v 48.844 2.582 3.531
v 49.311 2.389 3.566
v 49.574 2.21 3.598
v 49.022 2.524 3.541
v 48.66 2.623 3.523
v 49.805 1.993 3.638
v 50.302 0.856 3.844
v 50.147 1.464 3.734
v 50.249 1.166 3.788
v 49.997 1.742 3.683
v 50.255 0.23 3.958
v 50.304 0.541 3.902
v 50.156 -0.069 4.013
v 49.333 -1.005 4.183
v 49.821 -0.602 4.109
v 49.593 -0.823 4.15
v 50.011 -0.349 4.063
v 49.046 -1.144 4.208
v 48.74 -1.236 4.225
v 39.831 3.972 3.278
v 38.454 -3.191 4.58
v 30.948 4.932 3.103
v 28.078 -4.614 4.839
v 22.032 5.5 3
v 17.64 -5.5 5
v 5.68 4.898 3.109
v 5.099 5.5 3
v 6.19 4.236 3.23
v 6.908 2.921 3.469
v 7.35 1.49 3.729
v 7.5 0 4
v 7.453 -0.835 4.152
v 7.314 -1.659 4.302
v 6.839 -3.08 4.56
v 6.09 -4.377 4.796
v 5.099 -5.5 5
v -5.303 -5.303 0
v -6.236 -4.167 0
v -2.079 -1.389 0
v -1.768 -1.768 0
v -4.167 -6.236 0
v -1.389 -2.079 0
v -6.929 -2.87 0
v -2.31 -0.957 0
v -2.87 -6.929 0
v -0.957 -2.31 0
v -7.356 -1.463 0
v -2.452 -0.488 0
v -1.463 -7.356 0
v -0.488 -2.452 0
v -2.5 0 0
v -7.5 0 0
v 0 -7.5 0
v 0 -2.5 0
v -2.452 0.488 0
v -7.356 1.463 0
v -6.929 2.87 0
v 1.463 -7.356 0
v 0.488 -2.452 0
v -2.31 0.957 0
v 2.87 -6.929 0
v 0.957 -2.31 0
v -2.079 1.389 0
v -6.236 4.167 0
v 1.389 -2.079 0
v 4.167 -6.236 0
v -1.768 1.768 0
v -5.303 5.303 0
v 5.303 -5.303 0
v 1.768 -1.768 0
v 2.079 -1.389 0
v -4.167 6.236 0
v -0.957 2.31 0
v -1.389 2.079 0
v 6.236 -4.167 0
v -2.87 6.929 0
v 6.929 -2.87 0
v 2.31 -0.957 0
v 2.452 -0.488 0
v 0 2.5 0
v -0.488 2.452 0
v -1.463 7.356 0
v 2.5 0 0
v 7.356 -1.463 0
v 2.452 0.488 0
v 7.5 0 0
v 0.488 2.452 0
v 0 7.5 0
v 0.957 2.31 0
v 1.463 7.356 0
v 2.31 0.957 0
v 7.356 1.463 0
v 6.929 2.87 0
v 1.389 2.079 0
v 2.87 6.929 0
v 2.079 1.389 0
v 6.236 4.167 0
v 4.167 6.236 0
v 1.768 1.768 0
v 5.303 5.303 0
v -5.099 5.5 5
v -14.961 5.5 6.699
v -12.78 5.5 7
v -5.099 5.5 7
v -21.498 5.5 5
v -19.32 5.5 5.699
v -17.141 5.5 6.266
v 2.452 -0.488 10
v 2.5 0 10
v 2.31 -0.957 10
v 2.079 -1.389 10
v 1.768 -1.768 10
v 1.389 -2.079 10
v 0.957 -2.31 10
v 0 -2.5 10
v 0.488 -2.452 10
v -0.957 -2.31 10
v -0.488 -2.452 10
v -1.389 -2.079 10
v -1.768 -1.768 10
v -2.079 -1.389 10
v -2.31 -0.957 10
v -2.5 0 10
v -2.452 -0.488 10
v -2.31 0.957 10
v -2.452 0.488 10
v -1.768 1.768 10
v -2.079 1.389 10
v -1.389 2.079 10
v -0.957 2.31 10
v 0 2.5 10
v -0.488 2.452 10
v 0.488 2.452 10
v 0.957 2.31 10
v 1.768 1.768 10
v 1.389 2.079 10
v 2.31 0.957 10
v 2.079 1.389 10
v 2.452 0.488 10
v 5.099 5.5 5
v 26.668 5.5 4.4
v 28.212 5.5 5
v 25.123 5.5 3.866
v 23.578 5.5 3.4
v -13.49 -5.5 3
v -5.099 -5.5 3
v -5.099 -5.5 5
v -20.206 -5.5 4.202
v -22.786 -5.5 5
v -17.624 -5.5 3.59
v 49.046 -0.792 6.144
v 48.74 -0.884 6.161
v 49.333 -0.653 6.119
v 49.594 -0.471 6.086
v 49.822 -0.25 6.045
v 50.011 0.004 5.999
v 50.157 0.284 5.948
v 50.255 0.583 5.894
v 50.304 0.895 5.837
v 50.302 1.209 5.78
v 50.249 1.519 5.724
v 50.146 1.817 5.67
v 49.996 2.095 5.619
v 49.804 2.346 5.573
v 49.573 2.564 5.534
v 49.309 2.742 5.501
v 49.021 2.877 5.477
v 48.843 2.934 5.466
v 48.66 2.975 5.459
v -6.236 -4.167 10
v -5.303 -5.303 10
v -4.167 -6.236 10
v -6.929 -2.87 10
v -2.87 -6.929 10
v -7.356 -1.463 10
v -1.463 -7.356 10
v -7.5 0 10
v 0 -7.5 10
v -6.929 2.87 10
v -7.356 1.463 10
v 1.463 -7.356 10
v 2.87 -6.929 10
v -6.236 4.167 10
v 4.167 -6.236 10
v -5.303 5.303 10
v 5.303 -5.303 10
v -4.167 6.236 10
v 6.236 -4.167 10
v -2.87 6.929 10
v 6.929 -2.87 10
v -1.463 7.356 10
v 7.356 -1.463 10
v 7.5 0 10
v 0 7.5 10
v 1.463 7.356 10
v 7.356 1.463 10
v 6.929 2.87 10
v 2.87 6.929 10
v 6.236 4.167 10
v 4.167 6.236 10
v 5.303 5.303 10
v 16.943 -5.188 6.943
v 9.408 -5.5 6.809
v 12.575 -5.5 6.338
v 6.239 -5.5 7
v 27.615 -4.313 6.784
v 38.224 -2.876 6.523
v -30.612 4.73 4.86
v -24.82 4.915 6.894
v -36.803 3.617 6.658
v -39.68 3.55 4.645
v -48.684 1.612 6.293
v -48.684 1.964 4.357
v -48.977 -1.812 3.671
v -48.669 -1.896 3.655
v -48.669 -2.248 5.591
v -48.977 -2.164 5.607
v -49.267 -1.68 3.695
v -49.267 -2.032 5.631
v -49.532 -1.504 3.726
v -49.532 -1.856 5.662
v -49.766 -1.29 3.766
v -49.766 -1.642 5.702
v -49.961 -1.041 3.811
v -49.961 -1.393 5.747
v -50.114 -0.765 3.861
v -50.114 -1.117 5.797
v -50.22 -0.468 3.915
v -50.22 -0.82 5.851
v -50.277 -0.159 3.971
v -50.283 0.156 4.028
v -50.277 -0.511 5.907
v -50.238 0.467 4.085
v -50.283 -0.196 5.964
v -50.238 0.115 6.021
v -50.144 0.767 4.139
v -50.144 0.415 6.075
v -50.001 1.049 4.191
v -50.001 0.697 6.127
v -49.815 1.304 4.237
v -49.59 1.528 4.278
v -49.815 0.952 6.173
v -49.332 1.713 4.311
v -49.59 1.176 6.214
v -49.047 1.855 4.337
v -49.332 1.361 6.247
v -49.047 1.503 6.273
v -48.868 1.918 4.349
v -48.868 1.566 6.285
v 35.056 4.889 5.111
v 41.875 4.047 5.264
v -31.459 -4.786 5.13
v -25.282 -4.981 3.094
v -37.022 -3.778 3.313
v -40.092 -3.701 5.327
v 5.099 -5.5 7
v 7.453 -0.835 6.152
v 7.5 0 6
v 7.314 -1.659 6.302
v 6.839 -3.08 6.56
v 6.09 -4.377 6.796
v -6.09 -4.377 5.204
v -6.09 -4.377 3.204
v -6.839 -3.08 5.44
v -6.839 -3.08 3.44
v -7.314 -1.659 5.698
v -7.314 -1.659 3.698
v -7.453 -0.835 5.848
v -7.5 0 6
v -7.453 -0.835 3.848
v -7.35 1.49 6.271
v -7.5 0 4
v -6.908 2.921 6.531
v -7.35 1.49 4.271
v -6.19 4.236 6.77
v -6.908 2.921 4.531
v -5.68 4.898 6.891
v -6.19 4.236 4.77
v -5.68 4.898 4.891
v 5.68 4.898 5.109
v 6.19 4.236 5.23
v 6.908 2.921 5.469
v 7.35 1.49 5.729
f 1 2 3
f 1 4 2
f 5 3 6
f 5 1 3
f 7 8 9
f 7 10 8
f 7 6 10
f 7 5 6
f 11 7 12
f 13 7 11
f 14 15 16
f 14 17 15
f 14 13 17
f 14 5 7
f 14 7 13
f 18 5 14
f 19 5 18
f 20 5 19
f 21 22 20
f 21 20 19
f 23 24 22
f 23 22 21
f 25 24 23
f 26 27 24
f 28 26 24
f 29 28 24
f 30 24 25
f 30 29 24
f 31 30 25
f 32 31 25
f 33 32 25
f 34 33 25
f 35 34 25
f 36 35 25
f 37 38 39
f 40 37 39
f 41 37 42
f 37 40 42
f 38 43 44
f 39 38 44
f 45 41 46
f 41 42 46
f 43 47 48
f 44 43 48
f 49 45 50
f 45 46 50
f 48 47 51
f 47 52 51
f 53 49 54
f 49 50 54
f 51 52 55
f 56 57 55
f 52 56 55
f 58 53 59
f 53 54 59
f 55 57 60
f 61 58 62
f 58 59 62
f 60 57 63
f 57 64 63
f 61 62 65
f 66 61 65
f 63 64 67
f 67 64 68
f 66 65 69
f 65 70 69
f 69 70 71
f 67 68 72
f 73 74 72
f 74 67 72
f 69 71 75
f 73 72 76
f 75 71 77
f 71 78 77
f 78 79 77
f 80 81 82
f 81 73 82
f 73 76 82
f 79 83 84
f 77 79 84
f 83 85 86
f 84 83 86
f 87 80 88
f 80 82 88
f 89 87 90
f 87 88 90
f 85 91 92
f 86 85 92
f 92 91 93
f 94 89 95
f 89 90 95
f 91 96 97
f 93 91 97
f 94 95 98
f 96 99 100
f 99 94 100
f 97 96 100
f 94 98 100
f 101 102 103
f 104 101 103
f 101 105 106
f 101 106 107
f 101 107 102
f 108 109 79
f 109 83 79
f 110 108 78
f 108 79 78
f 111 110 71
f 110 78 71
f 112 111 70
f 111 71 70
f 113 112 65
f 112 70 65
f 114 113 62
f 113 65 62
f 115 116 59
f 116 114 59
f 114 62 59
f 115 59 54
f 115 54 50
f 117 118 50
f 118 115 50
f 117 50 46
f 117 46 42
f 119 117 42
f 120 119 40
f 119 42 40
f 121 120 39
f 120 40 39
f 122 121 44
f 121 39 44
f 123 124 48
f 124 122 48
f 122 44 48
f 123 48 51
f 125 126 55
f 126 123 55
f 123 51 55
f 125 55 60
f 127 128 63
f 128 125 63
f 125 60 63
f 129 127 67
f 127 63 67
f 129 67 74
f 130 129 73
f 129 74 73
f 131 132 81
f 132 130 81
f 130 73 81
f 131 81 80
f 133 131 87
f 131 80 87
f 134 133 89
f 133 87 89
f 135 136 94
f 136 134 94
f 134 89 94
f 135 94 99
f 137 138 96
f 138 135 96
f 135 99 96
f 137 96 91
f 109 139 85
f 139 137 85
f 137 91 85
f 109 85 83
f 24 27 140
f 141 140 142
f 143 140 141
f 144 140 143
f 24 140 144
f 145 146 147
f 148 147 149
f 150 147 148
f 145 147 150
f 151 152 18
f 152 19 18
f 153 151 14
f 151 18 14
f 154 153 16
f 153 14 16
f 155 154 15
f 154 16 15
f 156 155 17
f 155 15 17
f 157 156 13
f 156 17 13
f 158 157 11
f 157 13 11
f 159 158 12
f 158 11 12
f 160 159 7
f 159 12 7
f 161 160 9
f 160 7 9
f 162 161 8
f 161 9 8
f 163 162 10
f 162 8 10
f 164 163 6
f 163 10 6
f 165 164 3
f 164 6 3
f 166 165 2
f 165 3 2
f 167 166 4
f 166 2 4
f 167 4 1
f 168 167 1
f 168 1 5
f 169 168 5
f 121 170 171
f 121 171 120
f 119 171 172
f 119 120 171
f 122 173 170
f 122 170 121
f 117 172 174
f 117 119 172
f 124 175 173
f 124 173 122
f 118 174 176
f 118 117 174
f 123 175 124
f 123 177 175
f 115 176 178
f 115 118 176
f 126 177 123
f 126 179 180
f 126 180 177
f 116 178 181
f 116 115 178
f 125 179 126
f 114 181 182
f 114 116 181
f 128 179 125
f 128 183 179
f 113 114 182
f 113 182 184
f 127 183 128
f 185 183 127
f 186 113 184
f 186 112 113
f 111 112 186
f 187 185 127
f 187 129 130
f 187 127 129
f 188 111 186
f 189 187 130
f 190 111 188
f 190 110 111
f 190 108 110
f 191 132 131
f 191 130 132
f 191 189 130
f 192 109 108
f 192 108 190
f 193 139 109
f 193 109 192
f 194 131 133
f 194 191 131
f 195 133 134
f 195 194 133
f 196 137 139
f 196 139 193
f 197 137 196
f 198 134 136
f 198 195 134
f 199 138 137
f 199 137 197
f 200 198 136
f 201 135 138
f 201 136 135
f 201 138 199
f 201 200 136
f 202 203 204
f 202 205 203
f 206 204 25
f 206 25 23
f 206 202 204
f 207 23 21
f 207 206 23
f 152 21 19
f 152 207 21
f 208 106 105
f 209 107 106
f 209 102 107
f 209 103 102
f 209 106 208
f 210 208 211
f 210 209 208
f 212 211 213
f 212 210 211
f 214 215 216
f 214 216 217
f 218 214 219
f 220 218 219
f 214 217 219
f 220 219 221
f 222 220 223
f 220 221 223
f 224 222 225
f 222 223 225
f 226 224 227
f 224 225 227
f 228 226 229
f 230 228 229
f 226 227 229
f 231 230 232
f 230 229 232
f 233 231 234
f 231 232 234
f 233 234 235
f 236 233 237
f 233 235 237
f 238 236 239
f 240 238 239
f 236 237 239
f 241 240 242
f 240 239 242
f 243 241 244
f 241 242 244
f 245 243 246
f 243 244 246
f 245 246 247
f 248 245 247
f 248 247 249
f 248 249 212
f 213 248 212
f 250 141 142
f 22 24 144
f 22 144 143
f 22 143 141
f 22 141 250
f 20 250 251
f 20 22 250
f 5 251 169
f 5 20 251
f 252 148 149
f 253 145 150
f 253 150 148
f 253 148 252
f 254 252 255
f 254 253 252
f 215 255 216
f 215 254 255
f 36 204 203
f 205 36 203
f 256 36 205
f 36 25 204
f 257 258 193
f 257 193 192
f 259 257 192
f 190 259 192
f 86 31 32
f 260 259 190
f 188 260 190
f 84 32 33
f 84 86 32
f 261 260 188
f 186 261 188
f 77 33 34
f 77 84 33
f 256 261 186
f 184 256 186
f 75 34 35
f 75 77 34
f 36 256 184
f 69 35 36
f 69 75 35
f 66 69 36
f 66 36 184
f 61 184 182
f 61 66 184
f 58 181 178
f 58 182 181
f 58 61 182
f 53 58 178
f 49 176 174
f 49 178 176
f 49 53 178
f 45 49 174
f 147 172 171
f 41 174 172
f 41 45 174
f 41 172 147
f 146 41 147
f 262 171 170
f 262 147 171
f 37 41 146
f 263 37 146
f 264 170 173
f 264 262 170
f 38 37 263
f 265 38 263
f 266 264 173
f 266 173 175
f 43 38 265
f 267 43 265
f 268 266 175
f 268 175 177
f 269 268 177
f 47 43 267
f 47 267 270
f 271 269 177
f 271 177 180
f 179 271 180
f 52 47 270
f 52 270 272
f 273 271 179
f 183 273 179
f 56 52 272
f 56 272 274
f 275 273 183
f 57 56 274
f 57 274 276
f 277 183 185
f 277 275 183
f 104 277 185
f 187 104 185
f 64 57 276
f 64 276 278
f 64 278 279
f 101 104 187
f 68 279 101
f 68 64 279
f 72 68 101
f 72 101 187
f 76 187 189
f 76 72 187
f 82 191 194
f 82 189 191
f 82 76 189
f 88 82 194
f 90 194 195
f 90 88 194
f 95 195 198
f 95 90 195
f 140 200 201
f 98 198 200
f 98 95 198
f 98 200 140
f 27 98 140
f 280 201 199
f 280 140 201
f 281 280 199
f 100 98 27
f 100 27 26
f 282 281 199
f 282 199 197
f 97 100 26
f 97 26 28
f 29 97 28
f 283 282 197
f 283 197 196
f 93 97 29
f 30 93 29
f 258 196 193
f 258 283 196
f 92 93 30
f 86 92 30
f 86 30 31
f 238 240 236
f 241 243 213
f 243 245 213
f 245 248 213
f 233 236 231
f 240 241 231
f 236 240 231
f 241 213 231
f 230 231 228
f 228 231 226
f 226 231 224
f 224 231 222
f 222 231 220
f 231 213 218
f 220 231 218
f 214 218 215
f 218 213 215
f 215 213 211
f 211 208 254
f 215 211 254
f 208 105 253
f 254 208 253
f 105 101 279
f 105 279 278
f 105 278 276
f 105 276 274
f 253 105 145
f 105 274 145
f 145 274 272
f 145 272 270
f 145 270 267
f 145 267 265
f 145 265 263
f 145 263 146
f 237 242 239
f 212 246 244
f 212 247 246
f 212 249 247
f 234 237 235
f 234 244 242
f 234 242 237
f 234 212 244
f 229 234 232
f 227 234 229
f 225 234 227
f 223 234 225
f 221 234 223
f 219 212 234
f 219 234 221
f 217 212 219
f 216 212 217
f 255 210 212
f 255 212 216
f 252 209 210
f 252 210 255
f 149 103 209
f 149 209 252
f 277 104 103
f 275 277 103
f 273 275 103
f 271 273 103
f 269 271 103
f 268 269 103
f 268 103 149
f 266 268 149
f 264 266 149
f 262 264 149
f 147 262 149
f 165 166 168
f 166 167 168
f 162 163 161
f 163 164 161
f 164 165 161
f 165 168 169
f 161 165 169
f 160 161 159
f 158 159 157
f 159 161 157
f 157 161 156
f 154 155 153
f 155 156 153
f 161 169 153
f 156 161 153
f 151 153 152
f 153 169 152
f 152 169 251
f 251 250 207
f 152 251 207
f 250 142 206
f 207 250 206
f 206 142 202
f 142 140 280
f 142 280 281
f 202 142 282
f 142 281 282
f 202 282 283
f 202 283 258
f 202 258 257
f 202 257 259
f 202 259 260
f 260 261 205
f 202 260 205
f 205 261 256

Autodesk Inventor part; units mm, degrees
sketch "Sketch - Propeller Connecter" plane through (0, 0, 0) normal (0, 0, 1) x (1, 0, 0)
  circle A0 centre (0, 0) radius 7.5
  circle A1 centre (0, 0) radius 2.5
  dimension "d0" = 15
  dimension "d1" = 5
extrude "Extrusion1" add sketch "Sketch - Propeller Connecter" along normal blind 10
ref_plane "Work Plane1" through (0, 7.5, 0) normal (0, 1, 0) x (-1, 0, 0)
ref_plane "Work Plane2" through (-7.5, 0, 0) normal (1, 0, 0) x (0, 1, 0)
sketch "Sketch3" plane through (-7.5, 0, 0) normal (1, 0, 0) x (0, 1, 0)
  line L0 (7.5, 10) -> (-7.5, 10) projected
  line L1 (7.5, 10) -> (7.5, 0)
  line L2 (7.5, 0) -> (7.5, 10) projected
  line L3 (-7.5, 0) -> (7.5, 0) projected
  line L4 (-7.5, 10) -> (-7.5, 0)
  line L5 (-7.5, 0) -> (-7.5, 10) projected
  line L6 (5.5, 7) -> (-5.5, 5)
  line L7 (5.5, 5) -> (-5.5, 3)
  line L8 (5.5, 5) -> (5.5, 7)
  line L9 (-5.5, 3) -> (-5.5, 5)
  point P0 (0, 0)
  point P1 (0, 5)
  dimension "d27" = 5
  dimension "d28" = 3
  dimension "d29" = 3
  dimension "d30" = 5
  dimension "d32" = 2
  dimension "d33" = 2
  dimension "d34" = 2
  dimension "d35" = 2
sketch3d "3D Sketch2"
ref_plane "Work Plane3" through (7.5, 0, 0) normal (1, 0, 0) x (0, 1, 0)
sketch "Sketch4" plane through (7.5, 0, 0) normal (1, 0, 0) x (0, 1, 0)
  line L0 (5.5, 5) -> (-5.5, 7)
  line L1 (5.5, 3) -> (-5.5, 5)
  line L2 (5.5, 3) -> (5.5, 5)
  line L3 (-5.5, 5) -> (-5.5, 7)
  line L4 (7.5, 10) -> (-7.5, 10) projected
  line L5 (-7.5, 0) -> (7.5, 0) projected
  line L6 (-7.5, 0) -> (-7.5, 10)
  line L7 (7.5, 0) -> (7.5, 10)
  point P0 (0, 0)
  point P1 (0, 5)
  dimension "d38" = 3
  dimension "d39" = 5
  dimension "d40" = 3
  dimension "d42" = 5
  dimension "d43" = 2
  dimension "d44" = 2
  dimension "d45" = 2
  dimension "d46" = 2
sketch3d "3D Sketch3"
extrude "Extrusion2" add sketch "Sketch4" against normal blind 5 contours L2 L1 L3 L0
extrude "Extrusion3" add sketch "Sketch4" along normal blind 50 contours L2 L1 L3 L0
extrude "Extrusion4" add sketch "Sketch3" along normal blind 5 contours L8 L7 L9 L6
extrude "Extrusion5" add sketch "Sketch3" against normal blind 50 contours L8 L7 L9 L6
sketch "Sketch8" plane through (-5.099, -5.5, 3) normal (0, 0.1788854, -0.9838699) x (-1, 0, 0)
  line L0 (52.401, 0) -> (0, 0) projected
  line L1 (52.401, 11.1803) -> (52.401, 0) projected
  arc A0 (2.3083, 0) -> (52.401, 5.5902) centre (5.3498, 199.9769) ccw
  line L2 (52.401, 5.5902) -> (52.401, 0)
  line L3 (52.401, 0) -> (8.3914, 0)
  point P0 (-5.099, 4.8746)
  dimension "d59" = 200
extrude "Extrusion6" cut sketch "Sketch8" against normal blind 30 contours L0 A0 L1
sketch "Sketch15" plane through (57.5, 5.5, 3) normal (0, -0.1788854, -0.9838699) x (-1, 0, 0)
  line L0 (52.401, -0.3578) -> (52.401, 0) projected
  arc A0 (52.401, 0) -> (-0.7421, -4.8746) centre (43.9347, -199.8207) ccw
  line L1 (-0.7421, -4.8746) -> (-0.7421, 0)
  line L2 (-0.7421, 0) -> (35.4685, 0)
  point P0 (57.5, -4.8746)
  dimension "d67" = 200
extrude "Extrusion7" cut sketch "Sketch15" against normal blind 30
sketch "Sketch16" plane through (-57.5, 5.5, 7) normal (0, -0.1788854, 0.9838699) x (1, 0, 0)
  line L0 (52.401, -0.3578) -> (52.401, 0) projected
  line L1 (0, -5.9479) -> (0, 0) projected
  arc A0 (52.401, 0) -> (0, -5.9479) centre (48.5604, -199.9631) ccw
  line L2 (0, 0) -> (44.7198, 0)
  line L3 (52.401, 0) -> (0, 0) projected
  point P0 (57.5, -6.6635)
  dimension "d70" = 200
extrude "Extrusion8" cut sketch "Sketch16" against normal blind 30 contours L1 L2 A0
sketch "Sketch17" plane through (5.099, -5.5, 7) normal (0, 0.1788854, 0.9838699) x (1, 0, 0)
  ellipse E0 centre (-5.099, 5.5902) end of major axis (-5.099, -2.0328) minor radius 7.5 (0, 0) -> (0, 11.1803) ccw projected
  line L0 (52.401, 6.8321) -> (52.401, 0) projected
  arc A0 (0, 0) -> (52.401, 6.8321) centre (0.5699, 199.9992) ccw
  line L1 (52.401, 0) -> (1.1398, 0)
  line L2 (0, 0) -> (52.401, 0) projected
  point P0 (-5.099, 6.6635)
  dimension "d73" = 200
extrude "Extrusion9" cut sketch "Sketch17" against normal blind 30
fillet "Fillet1" radius 2 1 edges at (57.5, 1.0459, 4.8098)
fillet "Fillet2" radius 2 1 edges at (-57.5, -0.176, 4.968)
properties part number "propeller"
